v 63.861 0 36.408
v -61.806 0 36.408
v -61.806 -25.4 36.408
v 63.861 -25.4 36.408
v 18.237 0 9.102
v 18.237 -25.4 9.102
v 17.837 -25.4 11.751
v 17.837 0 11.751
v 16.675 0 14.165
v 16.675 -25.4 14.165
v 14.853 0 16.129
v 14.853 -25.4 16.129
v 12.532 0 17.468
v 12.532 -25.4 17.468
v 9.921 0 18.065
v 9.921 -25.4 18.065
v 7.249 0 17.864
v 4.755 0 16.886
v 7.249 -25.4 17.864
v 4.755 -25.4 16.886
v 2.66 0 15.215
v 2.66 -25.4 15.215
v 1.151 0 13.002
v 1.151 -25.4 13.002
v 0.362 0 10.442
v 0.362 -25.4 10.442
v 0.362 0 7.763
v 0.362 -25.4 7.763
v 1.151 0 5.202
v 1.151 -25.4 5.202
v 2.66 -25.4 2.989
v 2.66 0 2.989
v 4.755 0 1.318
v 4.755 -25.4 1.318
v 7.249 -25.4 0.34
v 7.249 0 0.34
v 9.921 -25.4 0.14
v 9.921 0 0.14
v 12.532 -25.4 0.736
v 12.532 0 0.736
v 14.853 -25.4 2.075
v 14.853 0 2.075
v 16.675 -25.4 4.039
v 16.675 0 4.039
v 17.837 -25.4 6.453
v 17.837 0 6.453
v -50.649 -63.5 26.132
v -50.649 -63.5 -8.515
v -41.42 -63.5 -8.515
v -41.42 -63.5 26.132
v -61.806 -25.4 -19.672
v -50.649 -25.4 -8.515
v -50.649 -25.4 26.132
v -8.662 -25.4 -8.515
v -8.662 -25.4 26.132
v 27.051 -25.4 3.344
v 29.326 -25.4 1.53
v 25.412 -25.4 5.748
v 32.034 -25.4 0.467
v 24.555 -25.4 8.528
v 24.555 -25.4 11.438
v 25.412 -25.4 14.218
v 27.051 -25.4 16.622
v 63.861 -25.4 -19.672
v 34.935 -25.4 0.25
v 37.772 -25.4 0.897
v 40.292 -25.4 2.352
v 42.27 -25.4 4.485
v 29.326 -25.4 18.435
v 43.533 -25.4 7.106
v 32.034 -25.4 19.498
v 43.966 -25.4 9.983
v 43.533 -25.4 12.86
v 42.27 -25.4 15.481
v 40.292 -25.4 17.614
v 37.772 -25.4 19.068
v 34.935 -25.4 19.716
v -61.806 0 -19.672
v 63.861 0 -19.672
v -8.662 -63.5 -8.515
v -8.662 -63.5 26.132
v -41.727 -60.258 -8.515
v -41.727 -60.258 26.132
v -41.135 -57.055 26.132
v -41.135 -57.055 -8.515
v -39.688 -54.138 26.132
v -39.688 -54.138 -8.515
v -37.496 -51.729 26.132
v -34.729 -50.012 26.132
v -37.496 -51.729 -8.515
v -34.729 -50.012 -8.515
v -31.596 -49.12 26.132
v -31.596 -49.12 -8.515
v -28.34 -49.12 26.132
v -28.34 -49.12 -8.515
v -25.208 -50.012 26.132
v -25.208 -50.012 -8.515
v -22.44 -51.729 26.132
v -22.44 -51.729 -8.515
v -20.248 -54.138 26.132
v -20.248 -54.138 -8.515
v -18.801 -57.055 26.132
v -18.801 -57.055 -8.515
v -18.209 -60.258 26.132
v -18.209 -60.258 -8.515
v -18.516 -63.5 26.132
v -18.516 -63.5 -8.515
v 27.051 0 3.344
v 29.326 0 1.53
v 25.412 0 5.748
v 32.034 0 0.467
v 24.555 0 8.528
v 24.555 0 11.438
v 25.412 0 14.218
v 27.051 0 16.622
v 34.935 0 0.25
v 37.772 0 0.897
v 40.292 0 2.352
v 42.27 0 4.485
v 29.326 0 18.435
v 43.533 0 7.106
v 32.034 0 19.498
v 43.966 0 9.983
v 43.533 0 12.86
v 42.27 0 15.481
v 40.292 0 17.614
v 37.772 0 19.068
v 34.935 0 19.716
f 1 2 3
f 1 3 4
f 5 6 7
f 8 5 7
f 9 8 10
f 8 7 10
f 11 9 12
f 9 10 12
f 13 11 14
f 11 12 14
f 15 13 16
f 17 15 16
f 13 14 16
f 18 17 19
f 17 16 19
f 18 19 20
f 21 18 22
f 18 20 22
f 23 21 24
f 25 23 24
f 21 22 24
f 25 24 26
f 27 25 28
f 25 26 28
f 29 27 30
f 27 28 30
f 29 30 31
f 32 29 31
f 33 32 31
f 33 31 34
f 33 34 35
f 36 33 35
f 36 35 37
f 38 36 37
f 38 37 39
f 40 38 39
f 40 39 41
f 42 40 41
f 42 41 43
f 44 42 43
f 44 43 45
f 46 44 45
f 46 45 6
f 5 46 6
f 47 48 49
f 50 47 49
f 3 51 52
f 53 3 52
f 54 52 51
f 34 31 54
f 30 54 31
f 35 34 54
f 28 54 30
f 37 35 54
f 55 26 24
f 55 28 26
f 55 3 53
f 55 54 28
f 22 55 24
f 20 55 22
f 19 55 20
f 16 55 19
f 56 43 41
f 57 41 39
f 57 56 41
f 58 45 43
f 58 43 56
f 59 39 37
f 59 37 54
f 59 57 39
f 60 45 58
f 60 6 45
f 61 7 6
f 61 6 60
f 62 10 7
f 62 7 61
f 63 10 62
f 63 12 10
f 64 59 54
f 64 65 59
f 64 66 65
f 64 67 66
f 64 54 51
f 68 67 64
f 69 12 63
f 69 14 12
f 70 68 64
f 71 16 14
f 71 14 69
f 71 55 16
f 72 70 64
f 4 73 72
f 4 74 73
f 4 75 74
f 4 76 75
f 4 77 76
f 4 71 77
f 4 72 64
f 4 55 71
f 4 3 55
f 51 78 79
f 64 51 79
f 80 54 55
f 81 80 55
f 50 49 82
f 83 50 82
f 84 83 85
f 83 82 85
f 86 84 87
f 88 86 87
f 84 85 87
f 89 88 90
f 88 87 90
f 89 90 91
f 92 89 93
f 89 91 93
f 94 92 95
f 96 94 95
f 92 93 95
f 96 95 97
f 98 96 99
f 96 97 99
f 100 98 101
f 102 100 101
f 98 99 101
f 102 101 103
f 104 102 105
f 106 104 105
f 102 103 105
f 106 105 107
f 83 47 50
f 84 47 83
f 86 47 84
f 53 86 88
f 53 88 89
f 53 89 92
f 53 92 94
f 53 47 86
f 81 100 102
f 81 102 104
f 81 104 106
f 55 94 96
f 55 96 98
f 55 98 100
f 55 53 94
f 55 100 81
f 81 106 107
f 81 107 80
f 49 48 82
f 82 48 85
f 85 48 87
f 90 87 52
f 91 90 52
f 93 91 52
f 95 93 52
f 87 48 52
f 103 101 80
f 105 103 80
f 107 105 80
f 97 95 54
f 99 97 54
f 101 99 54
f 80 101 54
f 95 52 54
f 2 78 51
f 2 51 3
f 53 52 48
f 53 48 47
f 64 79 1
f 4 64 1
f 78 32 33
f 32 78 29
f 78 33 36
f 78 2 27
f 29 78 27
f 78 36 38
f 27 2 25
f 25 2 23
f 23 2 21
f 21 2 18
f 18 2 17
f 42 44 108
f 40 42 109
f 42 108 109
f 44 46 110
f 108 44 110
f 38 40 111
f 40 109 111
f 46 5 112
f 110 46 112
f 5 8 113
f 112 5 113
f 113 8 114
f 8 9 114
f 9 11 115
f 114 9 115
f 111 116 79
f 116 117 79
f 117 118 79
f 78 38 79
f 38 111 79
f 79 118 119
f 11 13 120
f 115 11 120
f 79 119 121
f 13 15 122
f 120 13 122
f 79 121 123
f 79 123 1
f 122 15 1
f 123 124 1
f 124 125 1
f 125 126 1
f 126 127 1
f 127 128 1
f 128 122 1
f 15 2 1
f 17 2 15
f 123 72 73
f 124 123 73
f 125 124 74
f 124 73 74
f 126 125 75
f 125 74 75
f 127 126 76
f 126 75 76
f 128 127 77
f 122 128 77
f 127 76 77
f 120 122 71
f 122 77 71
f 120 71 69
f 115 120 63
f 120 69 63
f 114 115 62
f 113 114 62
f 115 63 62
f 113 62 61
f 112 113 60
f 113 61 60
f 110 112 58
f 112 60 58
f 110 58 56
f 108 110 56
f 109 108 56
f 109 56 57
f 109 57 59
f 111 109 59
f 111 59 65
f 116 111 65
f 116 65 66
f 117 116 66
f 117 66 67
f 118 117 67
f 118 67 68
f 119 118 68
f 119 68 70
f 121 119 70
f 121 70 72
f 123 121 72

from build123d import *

# Parameters (mm, degrees)
F0_W     = 125.667088
F0_H     = 56.080402
F1_DEPTH = 25.4
F2_W     = 41.9869
F2_H     = 34.646532
F3_DEPTH = 38.1
F5_DEPTH = 50.8
F6_R     = 8.98768
F6_R_2   = 9.7602
F7_DEPTH = 50.8


with BuildPart() as f1:
    # F0 (on Front) → F1 (new body)
    with BuildSketch(Plane.XZ):
        with Locations((1.027655, 8.368018)):
            Rectangle(F0_W, F0_H)
    extrude(amount=F1_DEPTH)

    # F2 (on face) → F3 (join)
    with BuildSketch(Plane.XZ.offset(25.4)):
        with Locations((-29.655083, 8.80844)):
            Rectangle(F2_W, F2_H)
    extrude(amount=F3_DEPTH)

    # F4 (on face) → F5 (cut)
    with BuildSketch(Plane(origin=(0, 0, -8.514826), x_dir=(1, 0, 0), z_dir=(0, 0, -1))):
        with BuildLine():
            Line((-18.516481, 63.5), (-41.419674, 63.5))
            ThreePointArc((-41.419674, 63.5), (-29.968077, 49.006404), (-18.516481, 63.5))
        make_face()
    extrude(amount=-F5_DEPTH, mode=Mode.SUBTRACT)

    # F6 (on face) → F7 (cut)
    with BuildSketch(Plane.XZ.offset(25.4)):
        with Locations((9.248862, 9.102055)):
            Circle(F6_R)
        with Locations((34.206115, 9.982899)):
            Circle(F6_R_2)
    extrude(amount=-F7_DEPTH, mode=Mode.SUBTRACT)


solid = f1.part
